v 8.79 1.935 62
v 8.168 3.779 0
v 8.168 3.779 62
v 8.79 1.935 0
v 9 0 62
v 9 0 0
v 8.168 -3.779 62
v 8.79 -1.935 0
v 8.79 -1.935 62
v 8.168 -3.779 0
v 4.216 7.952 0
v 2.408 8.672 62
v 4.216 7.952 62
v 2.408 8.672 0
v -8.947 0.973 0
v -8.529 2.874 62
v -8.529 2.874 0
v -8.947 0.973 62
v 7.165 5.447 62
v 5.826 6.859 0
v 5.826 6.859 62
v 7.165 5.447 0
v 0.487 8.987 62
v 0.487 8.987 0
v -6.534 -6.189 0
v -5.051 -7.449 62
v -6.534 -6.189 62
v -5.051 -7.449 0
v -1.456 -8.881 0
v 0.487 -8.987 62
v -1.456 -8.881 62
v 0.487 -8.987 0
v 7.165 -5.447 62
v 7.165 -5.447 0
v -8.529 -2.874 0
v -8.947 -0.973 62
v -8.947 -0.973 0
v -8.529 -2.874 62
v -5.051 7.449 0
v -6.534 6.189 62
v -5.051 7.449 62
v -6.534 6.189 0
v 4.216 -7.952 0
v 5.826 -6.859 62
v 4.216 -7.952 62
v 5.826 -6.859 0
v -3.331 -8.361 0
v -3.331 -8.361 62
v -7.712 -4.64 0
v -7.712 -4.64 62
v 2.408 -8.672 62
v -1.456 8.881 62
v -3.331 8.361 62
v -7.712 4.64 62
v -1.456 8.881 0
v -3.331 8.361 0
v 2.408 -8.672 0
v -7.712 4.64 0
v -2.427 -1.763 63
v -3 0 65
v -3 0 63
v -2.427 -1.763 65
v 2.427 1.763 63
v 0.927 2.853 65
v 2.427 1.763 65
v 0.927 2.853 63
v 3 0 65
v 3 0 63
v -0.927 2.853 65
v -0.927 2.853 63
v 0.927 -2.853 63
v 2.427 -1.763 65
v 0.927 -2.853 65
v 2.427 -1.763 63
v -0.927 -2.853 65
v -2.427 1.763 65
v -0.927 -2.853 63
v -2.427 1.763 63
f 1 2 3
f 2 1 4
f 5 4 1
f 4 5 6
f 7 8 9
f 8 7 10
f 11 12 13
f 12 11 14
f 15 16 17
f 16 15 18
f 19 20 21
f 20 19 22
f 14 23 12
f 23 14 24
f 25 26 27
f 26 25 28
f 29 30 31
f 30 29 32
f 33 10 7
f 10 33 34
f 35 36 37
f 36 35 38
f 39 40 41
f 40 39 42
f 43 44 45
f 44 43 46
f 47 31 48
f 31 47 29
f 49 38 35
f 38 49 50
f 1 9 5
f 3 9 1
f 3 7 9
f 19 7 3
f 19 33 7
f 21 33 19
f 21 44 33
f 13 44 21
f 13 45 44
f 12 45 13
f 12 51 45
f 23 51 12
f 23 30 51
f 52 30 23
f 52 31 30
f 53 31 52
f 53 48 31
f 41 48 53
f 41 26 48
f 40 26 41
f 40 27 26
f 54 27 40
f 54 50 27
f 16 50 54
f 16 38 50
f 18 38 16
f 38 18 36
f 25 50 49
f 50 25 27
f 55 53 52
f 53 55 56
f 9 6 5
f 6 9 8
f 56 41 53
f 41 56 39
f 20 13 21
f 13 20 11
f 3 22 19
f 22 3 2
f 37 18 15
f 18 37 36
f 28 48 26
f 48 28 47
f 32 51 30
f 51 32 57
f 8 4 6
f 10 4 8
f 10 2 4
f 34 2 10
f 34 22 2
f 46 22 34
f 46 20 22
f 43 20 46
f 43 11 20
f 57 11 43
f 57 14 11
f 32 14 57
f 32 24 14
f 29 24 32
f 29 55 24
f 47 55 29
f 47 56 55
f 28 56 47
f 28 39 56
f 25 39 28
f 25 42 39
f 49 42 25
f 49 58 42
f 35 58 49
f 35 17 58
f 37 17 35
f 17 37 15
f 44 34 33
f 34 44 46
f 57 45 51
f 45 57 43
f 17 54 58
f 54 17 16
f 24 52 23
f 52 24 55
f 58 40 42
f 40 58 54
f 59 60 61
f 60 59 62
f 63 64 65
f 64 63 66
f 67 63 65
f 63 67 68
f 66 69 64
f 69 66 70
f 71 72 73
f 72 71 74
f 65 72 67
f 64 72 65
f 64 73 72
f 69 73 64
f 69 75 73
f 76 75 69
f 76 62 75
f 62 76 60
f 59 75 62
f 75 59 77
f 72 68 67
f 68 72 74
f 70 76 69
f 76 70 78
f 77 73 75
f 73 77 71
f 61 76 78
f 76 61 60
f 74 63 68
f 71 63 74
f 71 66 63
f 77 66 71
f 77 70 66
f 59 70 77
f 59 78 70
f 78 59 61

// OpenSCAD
// Parameters for the battery cell
battery_diameter = 18; // Diameter of the battery
battery_height = 65;   // Overall height of the battery

// Parameters for the positive terminal
positive_terminal_diameter = 6;
positive_terminal_height = 2;

// Parameters for the negative terminal
negative_terminal_height = 1;

// Function to create the cylindrical cell body
module cylindrical_cell_body() {
    cylinder(h = battery_height - positive_terminal_height - negative_terminal_height, 
             d = battery_diameter, 
             center = false);
}

// Function to create the positive terminal button
module positive_terminal_button() {
    translate([0, 0, battery_height - positive_terminal_height])
        cylinder(h = positive_terminal_height, 
                 d = positive_terminal_diameter, 
                 center = false);
}

// Function to create the negative terminal flat end
module negative_terminal_flat_end() {
    translate([0, 0, 0])
        cylinder(h = negative_terminal_height, 
                 d = battery_diameter, 
                 center = false);
}

// Function to assemble the battery
module battery() {
    cylindrical_cell_body();
    positive_terminal_button();
    negative_terminal_flat_end();
}

// Render the battery
battery();
